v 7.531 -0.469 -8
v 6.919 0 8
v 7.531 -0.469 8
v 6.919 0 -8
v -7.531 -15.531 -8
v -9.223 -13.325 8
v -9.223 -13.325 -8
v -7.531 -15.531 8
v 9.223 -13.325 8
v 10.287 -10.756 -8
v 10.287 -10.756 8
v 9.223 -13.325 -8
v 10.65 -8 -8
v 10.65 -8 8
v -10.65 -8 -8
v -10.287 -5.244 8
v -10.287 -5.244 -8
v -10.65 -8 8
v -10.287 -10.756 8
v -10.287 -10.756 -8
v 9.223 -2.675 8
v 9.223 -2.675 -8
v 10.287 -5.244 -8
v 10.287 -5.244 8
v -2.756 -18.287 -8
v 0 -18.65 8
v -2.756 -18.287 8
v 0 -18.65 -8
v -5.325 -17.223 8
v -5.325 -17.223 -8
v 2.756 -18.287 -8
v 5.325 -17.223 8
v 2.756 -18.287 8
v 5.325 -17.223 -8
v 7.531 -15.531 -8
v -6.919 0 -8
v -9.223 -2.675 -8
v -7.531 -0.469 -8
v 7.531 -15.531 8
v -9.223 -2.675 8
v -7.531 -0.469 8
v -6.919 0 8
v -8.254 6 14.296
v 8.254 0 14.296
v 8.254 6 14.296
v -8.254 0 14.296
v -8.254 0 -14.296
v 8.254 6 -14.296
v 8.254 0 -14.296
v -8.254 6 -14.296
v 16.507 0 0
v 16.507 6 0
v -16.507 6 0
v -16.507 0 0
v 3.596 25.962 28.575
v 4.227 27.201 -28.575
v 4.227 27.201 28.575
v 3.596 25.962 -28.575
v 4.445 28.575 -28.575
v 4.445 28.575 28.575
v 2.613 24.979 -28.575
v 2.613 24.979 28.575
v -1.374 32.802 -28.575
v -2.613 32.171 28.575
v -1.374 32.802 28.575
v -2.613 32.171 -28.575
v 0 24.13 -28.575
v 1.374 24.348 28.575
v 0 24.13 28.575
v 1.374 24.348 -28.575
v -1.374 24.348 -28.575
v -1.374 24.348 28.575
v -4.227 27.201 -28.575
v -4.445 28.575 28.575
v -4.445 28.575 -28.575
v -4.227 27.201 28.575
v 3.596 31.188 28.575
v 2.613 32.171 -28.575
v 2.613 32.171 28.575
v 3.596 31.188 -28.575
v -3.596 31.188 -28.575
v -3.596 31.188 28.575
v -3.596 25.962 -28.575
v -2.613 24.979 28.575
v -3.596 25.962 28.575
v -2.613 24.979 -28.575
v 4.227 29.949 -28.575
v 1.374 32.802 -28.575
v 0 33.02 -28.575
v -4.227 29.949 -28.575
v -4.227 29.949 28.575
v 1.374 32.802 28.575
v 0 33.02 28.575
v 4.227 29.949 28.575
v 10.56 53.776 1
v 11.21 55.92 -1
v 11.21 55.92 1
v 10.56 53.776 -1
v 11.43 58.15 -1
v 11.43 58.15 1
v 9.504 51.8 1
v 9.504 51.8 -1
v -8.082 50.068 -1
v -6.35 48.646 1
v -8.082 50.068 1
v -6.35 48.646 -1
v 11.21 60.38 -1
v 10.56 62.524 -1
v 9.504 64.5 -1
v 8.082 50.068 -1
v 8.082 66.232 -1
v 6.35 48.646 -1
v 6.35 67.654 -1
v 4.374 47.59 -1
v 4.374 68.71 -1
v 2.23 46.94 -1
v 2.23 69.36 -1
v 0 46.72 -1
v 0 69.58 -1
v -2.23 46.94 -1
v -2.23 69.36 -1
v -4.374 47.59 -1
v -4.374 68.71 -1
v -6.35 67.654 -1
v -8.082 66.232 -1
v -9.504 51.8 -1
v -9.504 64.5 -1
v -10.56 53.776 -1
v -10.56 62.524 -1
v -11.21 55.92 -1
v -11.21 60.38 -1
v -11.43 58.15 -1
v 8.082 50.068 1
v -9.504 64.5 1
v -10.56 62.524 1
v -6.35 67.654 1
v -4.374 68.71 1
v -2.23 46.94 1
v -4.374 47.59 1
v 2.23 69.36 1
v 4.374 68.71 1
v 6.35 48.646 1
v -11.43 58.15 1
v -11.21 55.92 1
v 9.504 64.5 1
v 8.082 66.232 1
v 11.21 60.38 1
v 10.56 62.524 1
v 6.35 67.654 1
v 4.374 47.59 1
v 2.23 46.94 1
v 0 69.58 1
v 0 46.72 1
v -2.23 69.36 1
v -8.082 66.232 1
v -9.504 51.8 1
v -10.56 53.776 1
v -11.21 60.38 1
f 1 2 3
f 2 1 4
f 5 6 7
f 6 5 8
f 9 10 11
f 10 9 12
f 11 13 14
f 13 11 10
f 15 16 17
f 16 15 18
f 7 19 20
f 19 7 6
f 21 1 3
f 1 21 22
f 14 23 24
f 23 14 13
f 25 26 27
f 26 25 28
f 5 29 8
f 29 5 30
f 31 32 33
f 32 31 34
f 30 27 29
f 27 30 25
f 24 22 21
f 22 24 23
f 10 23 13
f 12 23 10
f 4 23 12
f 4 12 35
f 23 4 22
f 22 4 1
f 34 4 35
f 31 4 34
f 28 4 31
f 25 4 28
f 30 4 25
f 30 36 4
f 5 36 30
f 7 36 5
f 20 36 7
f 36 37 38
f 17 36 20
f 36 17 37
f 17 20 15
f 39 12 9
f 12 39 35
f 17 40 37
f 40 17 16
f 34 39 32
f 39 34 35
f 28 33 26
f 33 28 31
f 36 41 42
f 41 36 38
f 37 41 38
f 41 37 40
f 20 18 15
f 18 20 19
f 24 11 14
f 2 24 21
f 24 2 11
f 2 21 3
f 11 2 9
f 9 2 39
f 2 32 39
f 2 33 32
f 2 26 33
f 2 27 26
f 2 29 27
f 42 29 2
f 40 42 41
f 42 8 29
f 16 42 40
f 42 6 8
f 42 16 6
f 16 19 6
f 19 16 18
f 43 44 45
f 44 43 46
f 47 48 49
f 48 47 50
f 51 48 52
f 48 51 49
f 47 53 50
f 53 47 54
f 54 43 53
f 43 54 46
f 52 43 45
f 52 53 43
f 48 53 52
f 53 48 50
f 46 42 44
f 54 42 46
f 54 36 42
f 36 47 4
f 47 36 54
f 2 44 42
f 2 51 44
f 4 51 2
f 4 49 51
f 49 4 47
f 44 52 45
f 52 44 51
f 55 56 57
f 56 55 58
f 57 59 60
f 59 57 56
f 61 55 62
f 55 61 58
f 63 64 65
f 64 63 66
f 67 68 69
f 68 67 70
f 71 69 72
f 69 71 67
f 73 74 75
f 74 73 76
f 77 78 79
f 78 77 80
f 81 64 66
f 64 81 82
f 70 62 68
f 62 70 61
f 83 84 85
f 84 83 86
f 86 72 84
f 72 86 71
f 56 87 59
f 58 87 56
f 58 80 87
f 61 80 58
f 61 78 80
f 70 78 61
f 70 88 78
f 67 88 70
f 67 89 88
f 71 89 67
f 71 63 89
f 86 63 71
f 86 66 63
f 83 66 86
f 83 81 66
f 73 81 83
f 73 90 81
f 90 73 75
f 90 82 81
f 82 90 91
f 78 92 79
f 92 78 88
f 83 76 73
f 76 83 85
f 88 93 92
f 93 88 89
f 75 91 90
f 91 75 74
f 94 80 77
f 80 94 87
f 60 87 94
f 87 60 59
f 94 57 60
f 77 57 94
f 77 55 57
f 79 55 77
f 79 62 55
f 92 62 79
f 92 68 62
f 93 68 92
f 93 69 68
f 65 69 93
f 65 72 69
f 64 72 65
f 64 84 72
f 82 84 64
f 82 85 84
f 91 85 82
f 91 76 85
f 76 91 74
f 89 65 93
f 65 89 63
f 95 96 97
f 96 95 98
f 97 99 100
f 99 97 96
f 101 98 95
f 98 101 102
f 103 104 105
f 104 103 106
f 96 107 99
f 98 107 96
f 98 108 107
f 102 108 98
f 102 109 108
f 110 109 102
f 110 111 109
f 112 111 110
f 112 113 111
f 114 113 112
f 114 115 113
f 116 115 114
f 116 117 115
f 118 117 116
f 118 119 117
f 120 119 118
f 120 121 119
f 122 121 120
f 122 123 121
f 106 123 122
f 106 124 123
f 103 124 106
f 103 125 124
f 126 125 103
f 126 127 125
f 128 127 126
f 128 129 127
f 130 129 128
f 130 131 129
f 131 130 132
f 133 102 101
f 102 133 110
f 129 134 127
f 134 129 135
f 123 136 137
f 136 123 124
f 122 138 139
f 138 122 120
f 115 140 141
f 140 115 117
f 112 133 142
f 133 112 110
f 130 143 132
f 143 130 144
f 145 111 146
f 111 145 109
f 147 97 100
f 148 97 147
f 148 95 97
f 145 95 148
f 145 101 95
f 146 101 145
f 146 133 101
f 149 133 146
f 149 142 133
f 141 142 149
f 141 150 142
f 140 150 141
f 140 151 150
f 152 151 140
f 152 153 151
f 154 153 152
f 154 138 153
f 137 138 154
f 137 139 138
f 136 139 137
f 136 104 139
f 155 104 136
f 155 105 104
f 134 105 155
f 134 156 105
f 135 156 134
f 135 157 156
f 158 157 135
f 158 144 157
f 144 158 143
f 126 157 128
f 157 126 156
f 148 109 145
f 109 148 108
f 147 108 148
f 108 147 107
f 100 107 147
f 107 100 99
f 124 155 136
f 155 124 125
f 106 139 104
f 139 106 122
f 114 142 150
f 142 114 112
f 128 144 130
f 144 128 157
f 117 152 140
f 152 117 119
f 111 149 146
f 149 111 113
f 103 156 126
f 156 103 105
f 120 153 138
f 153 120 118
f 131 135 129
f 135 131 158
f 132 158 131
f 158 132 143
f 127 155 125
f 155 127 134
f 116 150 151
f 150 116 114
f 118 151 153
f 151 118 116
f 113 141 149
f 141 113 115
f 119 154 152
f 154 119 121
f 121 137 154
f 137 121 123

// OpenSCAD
// Auto-generated by scripts/author_from_manifest.py (Phase D.3).
// Source: data/phase_d_manifest.json (sku_intent='reliable-f156-upright-200f').
// Do not hand-edit — regenerate from the manifest.
//
// @part reliable_f156_upright_200f
// @kind sprinkler_head
// @category head.upright.k56
// @display-name "Reliable F1-56 Upright K5.6 SR 200°F"
// @mfg reliable_automatic_sprinkler
// @mfg-pn F1-56
// @listing UL FM
// @hazard-classes LH OH1
// @price-usd 12.75
// @install-minutes 8
// @crew journeyman
// @k-factor 5.6
// @orientation upright
// @response standard
// @temperature 200F
// @param size_in number default=0.5 label="Size" unit="in"
// @port inlet position=[0,0.014,0] direction=[0,1,0] style=NPT_threaded size_in=0.5 role=drop

size_in = 0.5;
k_factor = 5.6;

length_mm   = 57.15;
body_dia_mm = 25.40;
thread_od   = 21.3;
thread_len  = 16;
deflector_d = body_dia_mm * 0.9;

rotate([180,0,0]) union() {
    translate([0, thread_len/2, 0])
        cylinder(h = thread_len, d = thread_od, center = true, $fn = 24);
    translate([0, -3, 0])
        rotate([90, 0, 0])
        cylinder(h = 6, d = thread_od * 1.55, $fn = 6, center = true);
    translate([0, -length_mm/2, 0])
        cylinder(h = length_mm, d = body_dia_mm * 0.35, center = true, $fn = 20);
    translate([0, -length_mm - 1, 0])
        cylinder(h = 2, d = deflector_d, center = true, $fn = 32);
}
